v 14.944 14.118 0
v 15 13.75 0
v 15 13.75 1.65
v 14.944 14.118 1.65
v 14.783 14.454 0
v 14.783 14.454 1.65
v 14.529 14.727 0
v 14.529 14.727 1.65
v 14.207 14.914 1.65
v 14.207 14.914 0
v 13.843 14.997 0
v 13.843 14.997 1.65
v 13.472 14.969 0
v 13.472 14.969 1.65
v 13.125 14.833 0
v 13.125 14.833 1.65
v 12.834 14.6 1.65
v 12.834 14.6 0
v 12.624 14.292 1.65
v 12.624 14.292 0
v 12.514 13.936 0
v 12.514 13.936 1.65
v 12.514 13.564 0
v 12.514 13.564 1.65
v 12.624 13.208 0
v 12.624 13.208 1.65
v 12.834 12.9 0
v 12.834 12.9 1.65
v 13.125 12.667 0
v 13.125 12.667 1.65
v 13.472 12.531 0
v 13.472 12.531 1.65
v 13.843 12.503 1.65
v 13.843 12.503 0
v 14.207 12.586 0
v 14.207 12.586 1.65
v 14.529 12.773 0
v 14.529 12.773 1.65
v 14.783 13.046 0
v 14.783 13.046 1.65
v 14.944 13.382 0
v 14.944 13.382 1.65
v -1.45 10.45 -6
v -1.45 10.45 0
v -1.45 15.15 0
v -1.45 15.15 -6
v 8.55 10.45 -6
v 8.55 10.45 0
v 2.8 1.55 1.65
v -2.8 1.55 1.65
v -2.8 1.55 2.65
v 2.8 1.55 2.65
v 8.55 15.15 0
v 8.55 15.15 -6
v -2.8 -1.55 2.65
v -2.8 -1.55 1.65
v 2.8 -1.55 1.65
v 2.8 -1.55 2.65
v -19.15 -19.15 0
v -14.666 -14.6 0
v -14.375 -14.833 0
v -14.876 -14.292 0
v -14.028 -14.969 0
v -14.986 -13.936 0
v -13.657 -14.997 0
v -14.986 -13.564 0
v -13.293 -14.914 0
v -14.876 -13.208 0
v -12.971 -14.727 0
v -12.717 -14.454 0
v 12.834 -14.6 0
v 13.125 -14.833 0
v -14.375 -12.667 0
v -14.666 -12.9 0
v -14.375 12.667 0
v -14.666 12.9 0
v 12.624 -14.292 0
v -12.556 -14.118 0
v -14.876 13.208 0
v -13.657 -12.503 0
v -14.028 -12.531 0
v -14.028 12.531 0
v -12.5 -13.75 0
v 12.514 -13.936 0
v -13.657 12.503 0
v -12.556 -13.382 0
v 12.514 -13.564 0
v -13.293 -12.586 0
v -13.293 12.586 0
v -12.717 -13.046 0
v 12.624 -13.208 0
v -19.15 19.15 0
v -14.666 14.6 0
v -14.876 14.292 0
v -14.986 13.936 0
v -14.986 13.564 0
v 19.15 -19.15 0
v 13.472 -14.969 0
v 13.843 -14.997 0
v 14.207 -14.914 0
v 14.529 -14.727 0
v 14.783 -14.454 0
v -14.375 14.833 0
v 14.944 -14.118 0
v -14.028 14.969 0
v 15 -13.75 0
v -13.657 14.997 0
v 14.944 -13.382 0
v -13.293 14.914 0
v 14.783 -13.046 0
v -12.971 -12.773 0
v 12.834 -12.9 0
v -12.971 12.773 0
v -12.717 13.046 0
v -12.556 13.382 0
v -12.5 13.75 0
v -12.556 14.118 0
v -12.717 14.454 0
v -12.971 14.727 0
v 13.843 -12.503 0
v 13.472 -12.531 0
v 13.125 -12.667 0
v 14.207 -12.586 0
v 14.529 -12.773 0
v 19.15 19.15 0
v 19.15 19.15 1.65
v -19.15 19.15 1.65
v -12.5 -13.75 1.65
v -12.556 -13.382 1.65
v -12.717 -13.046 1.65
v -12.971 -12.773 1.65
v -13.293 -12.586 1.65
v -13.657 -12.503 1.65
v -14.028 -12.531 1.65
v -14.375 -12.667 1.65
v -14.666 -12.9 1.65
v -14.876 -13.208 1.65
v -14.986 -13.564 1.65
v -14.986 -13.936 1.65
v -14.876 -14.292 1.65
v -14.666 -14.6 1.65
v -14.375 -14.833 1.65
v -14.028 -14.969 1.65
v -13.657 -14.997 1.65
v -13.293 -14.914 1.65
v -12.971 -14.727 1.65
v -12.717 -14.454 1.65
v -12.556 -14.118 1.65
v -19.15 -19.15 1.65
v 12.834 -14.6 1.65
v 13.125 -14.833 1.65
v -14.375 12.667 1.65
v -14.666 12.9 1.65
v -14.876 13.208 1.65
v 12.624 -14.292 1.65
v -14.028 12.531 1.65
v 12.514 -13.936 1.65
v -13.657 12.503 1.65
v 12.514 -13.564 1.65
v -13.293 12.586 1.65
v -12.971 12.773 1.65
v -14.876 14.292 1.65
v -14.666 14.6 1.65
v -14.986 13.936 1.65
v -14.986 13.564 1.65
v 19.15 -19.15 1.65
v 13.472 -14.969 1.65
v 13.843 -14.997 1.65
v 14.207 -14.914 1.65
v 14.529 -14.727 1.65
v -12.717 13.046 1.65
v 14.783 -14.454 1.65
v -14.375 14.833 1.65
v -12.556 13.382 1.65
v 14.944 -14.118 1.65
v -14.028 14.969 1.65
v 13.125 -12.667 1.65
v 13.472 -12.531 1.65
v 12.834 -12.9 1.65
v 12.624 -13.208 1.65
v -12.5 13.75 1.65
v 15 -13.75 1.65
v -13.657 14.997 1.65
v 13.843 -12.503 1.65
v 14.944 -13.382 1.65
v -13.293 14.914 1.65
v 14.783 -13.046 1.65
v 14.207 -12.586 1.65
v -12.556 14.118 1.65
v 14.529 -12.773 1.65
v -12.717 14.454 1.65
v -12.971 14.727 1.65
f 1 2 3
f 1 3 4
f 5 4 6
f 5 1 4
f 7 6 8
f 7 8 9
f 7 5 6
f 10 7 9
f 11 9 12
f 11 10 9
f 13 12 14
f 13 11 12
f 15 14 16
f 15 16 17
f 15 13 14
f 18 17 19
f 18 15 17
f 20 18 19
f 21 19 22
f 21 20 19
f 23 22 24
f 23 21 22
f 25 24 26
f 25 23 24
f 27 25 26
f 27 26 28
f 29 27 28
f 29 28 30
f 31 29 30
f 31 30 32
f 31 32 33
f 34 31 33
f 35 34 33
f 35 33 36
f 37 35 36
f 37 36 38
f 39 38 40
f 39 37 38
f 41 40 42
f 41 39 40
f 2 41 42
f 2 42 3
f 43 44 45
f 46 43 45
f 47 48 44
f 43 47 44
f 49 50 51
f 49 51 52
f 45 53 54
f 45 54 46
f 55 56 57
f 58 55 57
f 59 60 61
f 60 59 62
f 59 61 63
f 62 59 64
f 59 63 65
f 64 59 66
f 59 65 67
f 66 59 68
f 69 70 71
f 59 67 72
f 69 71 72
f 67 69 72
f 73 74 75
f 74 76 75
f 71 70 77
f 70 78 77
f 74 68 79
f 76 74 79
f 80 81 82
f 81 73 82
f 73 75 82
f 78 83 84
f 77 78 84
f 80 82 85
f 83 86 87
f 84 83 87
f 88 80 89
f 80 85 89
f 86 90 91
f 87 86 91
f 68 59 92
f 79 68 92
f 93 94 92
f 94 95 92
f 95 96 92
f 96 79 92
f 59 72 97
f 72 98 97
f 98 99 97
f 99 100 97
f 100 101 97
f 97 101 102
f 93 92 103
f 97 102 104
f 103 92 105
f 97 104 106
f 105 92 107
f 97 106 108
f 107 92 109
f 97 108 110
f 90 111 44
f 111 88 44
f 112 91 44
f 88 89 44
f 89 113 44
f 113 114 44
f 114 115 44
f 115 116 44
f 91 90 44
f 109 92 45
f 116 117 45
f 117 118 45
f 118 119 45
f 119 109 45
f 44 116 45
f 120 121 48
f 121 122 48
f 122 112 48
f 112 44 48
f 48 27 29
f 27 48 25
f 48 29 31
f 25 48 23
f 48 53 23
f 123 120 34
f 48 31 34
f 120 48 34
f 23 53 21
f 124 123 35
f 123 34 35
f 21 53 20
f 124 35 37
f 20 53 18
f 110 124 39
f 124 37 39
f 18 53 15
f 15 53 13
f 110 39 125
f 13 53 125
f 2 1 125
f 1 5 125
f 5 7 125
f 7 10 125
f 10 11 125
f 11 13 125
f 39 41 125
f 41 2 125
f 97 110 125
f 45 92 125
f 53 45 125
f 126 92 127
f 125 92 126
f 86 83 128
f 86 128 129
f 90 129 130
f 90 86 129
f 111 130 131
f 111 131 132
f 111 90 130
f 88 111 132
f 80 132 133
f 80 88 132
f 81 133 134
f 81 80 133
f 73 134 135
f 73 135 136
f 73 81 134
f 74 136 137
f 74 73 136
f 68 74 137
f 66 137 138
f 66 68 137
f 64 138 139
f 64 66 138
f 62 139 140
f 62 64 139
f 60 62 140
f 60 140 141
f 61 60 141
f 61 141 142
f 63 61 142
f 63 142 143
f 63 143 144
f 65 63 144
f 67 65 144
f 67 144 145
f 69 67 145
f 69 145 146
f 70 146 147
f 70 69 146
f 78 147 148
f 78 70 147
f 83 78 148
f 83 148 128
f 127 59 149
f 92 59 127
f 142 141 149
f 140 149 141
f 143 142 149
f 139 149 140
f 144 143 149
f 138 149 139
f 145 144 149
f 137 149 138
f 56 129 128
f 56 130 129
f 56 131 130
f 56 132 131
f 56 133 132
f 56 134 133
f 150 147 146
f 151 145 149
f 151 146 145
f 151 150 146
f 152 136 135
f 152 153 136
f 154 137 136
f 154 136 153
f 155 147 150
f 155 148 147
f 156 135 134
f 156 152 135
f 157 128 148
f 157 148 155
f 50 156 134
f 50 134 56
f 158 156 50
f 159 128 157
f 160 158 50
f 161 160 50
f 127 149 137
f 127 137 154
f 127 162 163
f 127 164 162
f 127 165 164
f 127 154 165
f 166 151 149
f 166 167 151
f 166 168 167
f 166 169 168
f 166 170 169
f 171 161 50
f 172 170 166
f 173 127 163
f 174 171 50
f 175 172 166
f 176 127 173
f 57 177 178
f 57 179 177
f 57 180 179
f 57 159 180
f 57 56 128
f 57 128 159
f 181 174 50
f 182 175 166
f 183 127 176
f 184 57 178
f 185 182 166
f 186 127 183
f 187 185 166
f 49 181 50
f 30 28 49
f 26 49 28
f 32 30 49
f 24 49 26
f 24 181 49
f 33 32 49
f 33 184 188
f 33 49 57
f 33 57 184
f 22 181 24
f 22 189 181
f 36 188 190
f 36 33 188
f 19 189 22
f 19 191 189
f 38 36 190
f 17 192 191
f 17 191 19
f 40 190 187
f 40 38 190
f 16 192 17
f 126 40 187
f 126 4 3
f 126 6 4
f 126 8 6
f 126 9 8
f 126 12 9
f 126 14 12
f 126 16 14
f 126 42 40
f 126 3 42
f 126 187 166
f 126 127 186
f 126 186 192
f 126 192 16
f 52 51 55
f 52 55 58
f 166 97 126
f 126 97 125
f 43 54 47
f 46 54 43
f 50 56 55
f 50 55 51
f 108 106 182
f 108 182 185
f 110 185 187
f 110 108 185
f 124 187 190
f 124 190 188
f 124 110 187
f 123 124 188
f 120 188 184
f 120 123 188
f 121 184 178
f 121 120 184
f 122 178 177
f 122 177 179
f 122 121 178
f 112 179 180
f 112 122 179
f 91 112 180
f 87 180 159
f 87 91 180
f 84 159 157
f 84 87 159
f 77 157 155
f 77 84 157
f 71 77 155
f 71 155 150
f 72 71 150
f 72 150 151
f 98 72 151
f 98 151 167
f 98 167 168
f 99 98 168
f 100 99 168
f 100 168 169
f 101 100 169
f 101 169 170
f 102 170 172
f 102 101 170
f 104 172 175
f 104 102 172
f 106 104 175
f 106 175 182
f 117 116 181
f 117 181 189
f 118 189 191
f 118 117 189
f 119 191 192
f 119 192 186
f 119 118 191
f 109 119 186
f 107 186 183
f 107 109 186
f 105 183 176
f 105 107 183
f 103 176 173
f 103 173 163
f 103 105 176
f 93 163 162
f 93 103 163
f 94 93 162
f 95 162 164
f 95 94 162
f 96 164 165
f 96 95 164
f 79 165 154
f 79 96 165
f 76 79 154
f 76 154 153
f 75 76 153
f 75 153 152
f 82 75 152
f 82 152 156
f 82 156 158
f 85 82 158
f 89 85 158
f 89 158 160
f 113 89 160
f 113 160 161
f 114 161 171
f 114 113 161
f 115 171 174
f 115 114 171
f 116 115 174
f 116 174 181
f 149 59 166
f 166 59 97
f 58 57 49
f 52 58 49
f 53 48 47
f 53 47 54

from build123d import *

# Parameters (mm, degrees)
SKIZZE1_W                       = 38.3
SKIZZE1_H                       = 38.3
SKIZZE1_R                       = 1.25
AUFSATZ_LINEAR_AUSTRAGEN1_DEPTH = 1.65
SKIZZE2_W                       = 5.6
SKIZZE2_H                       = 3.1
AUFSATZ_LINEAR_AUSTRAGEN2_DEPTH = 1
SKETCH2_W                       = 10
SKETCH2_H                       = 4.7
BOSS_EXTRUDE1_DEPTH             = 6


with BuildPart() as part:
    # Skizze1 → Aufsatz-Linear austragen1 (new body)
    with BuildSketch(Plane.XY):
        Rectangle(SKIZZE1_W, SKIZZE1_H)
        with Locations((-13.75, 13.75)):
            Circle(SKIZZE1_R, mode=Mode.SUBTRACT)
        with Locations((13.75, 13.75)):
            Circle(SKIZZE1_R, mode=Mode.SUBTRACT)
        with Locations((13.75, -13.75)):
            Circle(SKIZZE1_R, mode=Mode.SUBTRACT)
        with Locations((-13.75, -13.75)):
            Circle(SKIZZE1_R, mode=Mode.SUBTRACT)
    extrude(amount=AUFSATZ_LINEAR_AUSTRAGEN1_DEPTH)

    # Skizze2 → Aufsatz-Linear austragen2 (add)
    with BuildSketch(Plane.XY.offset(1.65)):
        Rectangle(SKIZZE2_W, SKIZZE2_H)
    extrude(amount=AUFSATZ_LINEAR_AUSTRAGEN2_DEPTH)

    # Sketch2 → Boss-Extrude1 (add)
    with BuildSketch(Plane(origin=(0, 0, 0), x_dir=(-1, 0, 0), z_dir=(0, 0, -1))):
        with Locations((-3.55, 12.8)):
            Rectangle(SKETCH2_W, SKETCH2_H)
    extrude(amount=BOSS_EXTRUDE1_DEPTH)


solid = part.part
